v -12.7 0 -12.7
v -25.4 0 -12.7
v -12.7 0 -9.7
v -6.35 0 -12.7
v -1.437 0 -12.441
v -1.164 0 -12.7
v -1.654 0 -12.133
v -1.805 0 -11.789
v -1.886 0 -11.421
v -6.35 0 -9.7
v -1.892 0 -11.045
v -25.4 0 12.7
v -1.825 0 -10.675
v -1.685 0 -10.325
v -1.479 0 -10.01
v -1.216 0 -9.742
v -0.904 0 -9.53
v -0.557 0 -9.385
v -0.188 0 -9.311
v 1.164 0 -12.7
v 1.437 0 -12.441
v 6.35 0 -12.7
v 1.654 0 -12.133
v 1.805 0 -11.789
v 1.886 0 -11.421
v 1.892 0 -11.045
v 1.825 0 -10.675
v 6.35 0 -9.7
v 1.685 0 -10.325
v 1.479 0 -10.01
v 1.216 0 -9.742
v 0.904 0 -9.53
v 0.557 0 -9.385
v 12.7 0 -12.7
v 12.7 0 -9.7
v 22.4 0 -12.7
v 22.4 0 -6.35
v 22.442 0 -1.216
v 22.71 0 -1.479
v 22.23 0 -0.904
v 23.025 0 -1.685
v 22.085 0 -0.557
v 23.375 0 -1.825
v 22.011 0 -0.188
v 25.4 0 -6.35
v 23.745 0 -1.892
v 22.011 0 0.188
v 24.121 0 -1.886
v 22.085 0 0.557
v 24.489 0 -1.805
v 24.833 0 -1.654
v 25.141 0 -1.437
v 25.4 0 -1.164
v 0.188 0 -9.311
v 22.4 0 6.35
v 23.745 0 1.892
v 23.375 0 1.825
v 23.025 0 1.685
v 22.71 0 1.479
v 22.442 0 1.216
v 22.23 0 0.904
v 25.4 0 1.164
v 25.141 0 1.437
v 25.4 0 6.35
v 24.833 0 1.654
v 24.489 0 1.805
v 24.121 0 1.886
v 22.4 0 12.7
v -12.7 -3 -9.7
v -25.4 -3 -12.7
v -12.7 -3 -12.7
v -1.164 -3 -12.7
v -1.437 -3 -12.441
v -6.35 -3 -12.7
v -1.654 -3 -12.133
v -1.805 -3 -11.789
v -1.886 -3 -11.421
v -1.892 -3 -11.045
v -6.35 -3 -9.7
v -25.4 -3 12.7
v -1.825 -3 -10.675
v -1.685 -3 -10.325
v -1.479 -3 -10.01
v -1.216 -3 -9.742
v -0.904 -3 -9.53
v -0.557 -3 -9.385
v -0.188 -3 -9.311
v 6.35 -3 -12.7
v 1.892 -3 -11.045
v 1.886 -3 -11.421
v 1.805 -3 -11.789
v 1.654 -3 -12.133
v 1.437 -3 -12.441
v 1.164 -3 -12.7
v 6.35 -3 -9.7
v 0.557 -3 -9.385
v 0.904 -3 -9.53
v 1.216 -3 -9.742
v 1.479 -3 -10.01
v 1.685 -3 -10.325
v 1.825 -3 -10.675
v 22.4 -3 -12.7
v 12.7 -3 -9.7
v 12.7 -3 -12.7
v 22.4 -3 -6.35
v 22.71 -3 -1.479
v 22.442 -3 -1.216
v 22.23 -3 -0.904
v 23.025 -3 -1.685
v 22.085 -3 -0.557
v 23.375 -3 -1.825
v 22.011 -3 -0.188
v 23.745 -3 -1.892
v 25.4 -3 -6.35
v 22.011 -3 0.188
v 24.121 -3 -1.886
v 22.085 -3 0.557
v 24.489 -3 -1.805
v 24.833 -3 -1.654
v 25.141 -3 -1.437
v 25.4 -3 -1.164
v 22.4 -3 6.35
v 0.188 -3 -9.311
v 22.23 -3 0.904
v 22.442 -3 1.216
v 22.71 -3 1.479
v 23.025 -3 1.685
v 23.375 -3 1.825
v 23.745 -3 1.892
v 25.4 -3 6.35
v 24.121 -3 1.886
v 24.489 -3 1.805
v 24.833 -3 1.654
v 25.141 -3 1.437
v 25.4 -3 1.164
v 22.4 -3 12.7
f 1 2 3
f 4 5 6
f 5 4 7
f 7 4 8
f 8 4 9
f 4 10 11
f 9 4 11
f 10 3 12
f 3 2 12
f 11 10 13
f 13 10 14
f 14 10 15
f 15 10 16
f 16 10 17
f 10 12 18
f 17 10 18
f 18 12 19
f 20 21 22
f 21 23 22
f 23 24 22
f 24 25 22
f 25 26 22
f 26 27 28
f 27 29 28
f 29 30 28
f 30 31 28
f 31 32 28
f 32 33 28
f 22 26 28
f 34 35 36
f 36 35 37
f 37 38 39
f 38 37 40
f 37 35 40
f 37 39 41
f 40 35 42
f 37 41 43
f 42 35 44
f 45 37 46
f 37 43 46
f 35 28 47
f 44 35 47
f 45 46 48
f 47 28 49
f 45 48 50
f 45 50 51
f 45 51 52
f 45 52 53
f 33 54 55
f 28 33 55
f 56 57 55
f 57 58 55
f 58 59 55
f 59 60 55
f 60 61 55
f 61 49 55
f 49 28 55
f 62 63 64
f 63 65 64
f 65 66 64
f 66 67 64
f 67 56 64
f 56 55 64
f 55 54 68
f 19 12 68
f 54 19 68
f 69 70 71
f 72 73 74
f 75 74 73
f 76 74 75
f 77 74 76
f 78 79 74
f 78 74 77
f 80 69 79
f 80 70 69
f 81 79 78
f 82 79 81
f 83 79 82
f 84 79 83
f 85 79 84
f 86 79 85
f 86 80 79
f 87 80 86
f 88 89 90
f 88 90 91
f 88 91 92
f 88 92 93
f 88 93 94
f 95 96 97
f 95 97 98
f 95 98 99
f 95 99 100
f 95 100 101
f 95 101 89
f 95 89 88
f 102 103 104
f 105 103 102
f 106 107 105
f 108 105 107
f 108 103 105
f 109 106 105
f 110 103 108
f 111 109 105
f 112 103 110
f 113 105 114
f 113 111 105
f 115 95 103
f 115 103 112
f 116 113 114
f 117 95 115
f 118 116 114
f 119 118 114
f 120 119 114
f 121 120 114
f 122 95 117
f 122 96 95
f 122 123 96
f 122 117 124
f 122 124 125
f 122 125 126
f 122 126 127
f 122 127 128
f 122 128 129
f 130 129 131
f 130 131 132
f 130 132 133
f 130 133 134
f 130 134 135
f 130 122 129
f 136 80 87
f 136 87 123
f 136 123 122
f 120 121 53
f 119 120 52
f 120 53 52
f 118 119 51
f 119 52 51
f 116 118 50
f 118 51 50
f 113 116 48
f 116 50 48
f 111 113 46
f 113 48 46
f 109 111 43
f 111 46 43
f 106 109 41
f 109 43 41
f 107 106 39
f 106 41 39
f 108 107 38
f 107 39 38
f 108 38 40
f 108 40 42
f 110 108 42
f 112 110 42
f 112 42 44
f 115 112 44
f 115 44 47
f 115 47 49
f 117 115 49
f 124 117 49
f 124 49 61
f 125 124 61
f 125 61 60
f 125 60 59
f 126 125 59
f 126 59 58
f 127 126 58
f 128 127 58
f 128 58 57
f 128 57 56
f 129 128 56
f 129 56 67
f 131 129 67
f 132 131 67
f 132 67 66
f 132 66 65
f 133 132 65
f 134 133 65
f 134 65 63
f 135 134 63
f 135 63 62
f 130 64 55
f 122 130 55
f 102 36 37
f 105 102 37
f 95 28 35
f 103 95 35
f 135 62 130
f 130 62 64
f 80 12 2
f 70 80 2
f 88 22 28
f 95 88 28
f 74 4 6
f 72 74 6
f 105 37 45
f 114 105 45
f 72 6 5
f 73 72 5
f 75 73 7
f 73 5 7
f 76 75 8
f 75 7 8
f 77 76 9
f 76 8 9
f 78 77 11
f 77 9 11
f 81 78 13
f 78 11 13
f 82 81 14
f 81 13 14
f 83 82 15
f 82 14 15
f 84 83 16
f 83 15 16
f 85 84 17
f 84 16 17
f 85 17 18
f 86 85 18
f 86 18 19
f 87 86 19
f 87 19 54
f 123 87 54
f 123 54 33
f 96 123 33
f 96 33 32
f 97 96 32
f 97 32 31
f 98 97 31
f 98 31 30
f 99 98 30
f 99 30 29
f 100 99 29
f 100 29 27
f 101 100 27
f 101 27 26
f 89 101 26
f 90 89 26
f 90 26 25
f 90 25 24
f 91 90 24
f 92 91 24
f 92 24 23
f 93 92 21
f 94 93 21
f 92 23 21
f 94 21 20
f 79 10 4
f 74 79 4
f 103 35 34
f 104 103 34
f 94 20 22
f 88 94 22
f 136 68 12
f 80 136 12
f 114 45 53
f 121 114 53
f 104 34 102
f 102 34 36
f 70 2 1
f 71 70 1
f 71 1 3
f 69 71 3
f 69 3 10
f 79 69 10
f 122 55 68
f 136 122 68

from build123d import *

# Parameters (mm, degrees)
F1_DEPTH = 3
F3_D     = 3.7973
F4_D     = 3.7973


with BuildPart() as f1:
    # F0 (on Front) → F1 (new body)
    with BuildSketch(Plane.XZ):
        Polygon((22.4, 12.7), (-25.4, 12.7), (-25.4, -12.7), (-12.7, -12.7), (-12.7, -9.7), (-6.35, -9.7), (-6.35, -12.7), (6.3499999233, -12.7), (6.3499999233, -9.7), (12.6999999233, -9.7), (12.6999999233, -12.7), (22.4, -12.7), (22.4, -6.35), (25.4, -6.35), (25.4, 6.35), (22.4, 6.35), align=None)
    extrude(amount=F1_DEPTH)

    # F3 (through all)
    with Locations(Plane.XZ.offset(3)):
        with Locations((0, -11.2)):
            Hole(F3_D / 2)

    # F4 (through all)
    with Locations(Plane.XZ.offset(3)):
        with Locations((23.9, 0)):
            Hole(F4_D / 2)


solid = f1.part
